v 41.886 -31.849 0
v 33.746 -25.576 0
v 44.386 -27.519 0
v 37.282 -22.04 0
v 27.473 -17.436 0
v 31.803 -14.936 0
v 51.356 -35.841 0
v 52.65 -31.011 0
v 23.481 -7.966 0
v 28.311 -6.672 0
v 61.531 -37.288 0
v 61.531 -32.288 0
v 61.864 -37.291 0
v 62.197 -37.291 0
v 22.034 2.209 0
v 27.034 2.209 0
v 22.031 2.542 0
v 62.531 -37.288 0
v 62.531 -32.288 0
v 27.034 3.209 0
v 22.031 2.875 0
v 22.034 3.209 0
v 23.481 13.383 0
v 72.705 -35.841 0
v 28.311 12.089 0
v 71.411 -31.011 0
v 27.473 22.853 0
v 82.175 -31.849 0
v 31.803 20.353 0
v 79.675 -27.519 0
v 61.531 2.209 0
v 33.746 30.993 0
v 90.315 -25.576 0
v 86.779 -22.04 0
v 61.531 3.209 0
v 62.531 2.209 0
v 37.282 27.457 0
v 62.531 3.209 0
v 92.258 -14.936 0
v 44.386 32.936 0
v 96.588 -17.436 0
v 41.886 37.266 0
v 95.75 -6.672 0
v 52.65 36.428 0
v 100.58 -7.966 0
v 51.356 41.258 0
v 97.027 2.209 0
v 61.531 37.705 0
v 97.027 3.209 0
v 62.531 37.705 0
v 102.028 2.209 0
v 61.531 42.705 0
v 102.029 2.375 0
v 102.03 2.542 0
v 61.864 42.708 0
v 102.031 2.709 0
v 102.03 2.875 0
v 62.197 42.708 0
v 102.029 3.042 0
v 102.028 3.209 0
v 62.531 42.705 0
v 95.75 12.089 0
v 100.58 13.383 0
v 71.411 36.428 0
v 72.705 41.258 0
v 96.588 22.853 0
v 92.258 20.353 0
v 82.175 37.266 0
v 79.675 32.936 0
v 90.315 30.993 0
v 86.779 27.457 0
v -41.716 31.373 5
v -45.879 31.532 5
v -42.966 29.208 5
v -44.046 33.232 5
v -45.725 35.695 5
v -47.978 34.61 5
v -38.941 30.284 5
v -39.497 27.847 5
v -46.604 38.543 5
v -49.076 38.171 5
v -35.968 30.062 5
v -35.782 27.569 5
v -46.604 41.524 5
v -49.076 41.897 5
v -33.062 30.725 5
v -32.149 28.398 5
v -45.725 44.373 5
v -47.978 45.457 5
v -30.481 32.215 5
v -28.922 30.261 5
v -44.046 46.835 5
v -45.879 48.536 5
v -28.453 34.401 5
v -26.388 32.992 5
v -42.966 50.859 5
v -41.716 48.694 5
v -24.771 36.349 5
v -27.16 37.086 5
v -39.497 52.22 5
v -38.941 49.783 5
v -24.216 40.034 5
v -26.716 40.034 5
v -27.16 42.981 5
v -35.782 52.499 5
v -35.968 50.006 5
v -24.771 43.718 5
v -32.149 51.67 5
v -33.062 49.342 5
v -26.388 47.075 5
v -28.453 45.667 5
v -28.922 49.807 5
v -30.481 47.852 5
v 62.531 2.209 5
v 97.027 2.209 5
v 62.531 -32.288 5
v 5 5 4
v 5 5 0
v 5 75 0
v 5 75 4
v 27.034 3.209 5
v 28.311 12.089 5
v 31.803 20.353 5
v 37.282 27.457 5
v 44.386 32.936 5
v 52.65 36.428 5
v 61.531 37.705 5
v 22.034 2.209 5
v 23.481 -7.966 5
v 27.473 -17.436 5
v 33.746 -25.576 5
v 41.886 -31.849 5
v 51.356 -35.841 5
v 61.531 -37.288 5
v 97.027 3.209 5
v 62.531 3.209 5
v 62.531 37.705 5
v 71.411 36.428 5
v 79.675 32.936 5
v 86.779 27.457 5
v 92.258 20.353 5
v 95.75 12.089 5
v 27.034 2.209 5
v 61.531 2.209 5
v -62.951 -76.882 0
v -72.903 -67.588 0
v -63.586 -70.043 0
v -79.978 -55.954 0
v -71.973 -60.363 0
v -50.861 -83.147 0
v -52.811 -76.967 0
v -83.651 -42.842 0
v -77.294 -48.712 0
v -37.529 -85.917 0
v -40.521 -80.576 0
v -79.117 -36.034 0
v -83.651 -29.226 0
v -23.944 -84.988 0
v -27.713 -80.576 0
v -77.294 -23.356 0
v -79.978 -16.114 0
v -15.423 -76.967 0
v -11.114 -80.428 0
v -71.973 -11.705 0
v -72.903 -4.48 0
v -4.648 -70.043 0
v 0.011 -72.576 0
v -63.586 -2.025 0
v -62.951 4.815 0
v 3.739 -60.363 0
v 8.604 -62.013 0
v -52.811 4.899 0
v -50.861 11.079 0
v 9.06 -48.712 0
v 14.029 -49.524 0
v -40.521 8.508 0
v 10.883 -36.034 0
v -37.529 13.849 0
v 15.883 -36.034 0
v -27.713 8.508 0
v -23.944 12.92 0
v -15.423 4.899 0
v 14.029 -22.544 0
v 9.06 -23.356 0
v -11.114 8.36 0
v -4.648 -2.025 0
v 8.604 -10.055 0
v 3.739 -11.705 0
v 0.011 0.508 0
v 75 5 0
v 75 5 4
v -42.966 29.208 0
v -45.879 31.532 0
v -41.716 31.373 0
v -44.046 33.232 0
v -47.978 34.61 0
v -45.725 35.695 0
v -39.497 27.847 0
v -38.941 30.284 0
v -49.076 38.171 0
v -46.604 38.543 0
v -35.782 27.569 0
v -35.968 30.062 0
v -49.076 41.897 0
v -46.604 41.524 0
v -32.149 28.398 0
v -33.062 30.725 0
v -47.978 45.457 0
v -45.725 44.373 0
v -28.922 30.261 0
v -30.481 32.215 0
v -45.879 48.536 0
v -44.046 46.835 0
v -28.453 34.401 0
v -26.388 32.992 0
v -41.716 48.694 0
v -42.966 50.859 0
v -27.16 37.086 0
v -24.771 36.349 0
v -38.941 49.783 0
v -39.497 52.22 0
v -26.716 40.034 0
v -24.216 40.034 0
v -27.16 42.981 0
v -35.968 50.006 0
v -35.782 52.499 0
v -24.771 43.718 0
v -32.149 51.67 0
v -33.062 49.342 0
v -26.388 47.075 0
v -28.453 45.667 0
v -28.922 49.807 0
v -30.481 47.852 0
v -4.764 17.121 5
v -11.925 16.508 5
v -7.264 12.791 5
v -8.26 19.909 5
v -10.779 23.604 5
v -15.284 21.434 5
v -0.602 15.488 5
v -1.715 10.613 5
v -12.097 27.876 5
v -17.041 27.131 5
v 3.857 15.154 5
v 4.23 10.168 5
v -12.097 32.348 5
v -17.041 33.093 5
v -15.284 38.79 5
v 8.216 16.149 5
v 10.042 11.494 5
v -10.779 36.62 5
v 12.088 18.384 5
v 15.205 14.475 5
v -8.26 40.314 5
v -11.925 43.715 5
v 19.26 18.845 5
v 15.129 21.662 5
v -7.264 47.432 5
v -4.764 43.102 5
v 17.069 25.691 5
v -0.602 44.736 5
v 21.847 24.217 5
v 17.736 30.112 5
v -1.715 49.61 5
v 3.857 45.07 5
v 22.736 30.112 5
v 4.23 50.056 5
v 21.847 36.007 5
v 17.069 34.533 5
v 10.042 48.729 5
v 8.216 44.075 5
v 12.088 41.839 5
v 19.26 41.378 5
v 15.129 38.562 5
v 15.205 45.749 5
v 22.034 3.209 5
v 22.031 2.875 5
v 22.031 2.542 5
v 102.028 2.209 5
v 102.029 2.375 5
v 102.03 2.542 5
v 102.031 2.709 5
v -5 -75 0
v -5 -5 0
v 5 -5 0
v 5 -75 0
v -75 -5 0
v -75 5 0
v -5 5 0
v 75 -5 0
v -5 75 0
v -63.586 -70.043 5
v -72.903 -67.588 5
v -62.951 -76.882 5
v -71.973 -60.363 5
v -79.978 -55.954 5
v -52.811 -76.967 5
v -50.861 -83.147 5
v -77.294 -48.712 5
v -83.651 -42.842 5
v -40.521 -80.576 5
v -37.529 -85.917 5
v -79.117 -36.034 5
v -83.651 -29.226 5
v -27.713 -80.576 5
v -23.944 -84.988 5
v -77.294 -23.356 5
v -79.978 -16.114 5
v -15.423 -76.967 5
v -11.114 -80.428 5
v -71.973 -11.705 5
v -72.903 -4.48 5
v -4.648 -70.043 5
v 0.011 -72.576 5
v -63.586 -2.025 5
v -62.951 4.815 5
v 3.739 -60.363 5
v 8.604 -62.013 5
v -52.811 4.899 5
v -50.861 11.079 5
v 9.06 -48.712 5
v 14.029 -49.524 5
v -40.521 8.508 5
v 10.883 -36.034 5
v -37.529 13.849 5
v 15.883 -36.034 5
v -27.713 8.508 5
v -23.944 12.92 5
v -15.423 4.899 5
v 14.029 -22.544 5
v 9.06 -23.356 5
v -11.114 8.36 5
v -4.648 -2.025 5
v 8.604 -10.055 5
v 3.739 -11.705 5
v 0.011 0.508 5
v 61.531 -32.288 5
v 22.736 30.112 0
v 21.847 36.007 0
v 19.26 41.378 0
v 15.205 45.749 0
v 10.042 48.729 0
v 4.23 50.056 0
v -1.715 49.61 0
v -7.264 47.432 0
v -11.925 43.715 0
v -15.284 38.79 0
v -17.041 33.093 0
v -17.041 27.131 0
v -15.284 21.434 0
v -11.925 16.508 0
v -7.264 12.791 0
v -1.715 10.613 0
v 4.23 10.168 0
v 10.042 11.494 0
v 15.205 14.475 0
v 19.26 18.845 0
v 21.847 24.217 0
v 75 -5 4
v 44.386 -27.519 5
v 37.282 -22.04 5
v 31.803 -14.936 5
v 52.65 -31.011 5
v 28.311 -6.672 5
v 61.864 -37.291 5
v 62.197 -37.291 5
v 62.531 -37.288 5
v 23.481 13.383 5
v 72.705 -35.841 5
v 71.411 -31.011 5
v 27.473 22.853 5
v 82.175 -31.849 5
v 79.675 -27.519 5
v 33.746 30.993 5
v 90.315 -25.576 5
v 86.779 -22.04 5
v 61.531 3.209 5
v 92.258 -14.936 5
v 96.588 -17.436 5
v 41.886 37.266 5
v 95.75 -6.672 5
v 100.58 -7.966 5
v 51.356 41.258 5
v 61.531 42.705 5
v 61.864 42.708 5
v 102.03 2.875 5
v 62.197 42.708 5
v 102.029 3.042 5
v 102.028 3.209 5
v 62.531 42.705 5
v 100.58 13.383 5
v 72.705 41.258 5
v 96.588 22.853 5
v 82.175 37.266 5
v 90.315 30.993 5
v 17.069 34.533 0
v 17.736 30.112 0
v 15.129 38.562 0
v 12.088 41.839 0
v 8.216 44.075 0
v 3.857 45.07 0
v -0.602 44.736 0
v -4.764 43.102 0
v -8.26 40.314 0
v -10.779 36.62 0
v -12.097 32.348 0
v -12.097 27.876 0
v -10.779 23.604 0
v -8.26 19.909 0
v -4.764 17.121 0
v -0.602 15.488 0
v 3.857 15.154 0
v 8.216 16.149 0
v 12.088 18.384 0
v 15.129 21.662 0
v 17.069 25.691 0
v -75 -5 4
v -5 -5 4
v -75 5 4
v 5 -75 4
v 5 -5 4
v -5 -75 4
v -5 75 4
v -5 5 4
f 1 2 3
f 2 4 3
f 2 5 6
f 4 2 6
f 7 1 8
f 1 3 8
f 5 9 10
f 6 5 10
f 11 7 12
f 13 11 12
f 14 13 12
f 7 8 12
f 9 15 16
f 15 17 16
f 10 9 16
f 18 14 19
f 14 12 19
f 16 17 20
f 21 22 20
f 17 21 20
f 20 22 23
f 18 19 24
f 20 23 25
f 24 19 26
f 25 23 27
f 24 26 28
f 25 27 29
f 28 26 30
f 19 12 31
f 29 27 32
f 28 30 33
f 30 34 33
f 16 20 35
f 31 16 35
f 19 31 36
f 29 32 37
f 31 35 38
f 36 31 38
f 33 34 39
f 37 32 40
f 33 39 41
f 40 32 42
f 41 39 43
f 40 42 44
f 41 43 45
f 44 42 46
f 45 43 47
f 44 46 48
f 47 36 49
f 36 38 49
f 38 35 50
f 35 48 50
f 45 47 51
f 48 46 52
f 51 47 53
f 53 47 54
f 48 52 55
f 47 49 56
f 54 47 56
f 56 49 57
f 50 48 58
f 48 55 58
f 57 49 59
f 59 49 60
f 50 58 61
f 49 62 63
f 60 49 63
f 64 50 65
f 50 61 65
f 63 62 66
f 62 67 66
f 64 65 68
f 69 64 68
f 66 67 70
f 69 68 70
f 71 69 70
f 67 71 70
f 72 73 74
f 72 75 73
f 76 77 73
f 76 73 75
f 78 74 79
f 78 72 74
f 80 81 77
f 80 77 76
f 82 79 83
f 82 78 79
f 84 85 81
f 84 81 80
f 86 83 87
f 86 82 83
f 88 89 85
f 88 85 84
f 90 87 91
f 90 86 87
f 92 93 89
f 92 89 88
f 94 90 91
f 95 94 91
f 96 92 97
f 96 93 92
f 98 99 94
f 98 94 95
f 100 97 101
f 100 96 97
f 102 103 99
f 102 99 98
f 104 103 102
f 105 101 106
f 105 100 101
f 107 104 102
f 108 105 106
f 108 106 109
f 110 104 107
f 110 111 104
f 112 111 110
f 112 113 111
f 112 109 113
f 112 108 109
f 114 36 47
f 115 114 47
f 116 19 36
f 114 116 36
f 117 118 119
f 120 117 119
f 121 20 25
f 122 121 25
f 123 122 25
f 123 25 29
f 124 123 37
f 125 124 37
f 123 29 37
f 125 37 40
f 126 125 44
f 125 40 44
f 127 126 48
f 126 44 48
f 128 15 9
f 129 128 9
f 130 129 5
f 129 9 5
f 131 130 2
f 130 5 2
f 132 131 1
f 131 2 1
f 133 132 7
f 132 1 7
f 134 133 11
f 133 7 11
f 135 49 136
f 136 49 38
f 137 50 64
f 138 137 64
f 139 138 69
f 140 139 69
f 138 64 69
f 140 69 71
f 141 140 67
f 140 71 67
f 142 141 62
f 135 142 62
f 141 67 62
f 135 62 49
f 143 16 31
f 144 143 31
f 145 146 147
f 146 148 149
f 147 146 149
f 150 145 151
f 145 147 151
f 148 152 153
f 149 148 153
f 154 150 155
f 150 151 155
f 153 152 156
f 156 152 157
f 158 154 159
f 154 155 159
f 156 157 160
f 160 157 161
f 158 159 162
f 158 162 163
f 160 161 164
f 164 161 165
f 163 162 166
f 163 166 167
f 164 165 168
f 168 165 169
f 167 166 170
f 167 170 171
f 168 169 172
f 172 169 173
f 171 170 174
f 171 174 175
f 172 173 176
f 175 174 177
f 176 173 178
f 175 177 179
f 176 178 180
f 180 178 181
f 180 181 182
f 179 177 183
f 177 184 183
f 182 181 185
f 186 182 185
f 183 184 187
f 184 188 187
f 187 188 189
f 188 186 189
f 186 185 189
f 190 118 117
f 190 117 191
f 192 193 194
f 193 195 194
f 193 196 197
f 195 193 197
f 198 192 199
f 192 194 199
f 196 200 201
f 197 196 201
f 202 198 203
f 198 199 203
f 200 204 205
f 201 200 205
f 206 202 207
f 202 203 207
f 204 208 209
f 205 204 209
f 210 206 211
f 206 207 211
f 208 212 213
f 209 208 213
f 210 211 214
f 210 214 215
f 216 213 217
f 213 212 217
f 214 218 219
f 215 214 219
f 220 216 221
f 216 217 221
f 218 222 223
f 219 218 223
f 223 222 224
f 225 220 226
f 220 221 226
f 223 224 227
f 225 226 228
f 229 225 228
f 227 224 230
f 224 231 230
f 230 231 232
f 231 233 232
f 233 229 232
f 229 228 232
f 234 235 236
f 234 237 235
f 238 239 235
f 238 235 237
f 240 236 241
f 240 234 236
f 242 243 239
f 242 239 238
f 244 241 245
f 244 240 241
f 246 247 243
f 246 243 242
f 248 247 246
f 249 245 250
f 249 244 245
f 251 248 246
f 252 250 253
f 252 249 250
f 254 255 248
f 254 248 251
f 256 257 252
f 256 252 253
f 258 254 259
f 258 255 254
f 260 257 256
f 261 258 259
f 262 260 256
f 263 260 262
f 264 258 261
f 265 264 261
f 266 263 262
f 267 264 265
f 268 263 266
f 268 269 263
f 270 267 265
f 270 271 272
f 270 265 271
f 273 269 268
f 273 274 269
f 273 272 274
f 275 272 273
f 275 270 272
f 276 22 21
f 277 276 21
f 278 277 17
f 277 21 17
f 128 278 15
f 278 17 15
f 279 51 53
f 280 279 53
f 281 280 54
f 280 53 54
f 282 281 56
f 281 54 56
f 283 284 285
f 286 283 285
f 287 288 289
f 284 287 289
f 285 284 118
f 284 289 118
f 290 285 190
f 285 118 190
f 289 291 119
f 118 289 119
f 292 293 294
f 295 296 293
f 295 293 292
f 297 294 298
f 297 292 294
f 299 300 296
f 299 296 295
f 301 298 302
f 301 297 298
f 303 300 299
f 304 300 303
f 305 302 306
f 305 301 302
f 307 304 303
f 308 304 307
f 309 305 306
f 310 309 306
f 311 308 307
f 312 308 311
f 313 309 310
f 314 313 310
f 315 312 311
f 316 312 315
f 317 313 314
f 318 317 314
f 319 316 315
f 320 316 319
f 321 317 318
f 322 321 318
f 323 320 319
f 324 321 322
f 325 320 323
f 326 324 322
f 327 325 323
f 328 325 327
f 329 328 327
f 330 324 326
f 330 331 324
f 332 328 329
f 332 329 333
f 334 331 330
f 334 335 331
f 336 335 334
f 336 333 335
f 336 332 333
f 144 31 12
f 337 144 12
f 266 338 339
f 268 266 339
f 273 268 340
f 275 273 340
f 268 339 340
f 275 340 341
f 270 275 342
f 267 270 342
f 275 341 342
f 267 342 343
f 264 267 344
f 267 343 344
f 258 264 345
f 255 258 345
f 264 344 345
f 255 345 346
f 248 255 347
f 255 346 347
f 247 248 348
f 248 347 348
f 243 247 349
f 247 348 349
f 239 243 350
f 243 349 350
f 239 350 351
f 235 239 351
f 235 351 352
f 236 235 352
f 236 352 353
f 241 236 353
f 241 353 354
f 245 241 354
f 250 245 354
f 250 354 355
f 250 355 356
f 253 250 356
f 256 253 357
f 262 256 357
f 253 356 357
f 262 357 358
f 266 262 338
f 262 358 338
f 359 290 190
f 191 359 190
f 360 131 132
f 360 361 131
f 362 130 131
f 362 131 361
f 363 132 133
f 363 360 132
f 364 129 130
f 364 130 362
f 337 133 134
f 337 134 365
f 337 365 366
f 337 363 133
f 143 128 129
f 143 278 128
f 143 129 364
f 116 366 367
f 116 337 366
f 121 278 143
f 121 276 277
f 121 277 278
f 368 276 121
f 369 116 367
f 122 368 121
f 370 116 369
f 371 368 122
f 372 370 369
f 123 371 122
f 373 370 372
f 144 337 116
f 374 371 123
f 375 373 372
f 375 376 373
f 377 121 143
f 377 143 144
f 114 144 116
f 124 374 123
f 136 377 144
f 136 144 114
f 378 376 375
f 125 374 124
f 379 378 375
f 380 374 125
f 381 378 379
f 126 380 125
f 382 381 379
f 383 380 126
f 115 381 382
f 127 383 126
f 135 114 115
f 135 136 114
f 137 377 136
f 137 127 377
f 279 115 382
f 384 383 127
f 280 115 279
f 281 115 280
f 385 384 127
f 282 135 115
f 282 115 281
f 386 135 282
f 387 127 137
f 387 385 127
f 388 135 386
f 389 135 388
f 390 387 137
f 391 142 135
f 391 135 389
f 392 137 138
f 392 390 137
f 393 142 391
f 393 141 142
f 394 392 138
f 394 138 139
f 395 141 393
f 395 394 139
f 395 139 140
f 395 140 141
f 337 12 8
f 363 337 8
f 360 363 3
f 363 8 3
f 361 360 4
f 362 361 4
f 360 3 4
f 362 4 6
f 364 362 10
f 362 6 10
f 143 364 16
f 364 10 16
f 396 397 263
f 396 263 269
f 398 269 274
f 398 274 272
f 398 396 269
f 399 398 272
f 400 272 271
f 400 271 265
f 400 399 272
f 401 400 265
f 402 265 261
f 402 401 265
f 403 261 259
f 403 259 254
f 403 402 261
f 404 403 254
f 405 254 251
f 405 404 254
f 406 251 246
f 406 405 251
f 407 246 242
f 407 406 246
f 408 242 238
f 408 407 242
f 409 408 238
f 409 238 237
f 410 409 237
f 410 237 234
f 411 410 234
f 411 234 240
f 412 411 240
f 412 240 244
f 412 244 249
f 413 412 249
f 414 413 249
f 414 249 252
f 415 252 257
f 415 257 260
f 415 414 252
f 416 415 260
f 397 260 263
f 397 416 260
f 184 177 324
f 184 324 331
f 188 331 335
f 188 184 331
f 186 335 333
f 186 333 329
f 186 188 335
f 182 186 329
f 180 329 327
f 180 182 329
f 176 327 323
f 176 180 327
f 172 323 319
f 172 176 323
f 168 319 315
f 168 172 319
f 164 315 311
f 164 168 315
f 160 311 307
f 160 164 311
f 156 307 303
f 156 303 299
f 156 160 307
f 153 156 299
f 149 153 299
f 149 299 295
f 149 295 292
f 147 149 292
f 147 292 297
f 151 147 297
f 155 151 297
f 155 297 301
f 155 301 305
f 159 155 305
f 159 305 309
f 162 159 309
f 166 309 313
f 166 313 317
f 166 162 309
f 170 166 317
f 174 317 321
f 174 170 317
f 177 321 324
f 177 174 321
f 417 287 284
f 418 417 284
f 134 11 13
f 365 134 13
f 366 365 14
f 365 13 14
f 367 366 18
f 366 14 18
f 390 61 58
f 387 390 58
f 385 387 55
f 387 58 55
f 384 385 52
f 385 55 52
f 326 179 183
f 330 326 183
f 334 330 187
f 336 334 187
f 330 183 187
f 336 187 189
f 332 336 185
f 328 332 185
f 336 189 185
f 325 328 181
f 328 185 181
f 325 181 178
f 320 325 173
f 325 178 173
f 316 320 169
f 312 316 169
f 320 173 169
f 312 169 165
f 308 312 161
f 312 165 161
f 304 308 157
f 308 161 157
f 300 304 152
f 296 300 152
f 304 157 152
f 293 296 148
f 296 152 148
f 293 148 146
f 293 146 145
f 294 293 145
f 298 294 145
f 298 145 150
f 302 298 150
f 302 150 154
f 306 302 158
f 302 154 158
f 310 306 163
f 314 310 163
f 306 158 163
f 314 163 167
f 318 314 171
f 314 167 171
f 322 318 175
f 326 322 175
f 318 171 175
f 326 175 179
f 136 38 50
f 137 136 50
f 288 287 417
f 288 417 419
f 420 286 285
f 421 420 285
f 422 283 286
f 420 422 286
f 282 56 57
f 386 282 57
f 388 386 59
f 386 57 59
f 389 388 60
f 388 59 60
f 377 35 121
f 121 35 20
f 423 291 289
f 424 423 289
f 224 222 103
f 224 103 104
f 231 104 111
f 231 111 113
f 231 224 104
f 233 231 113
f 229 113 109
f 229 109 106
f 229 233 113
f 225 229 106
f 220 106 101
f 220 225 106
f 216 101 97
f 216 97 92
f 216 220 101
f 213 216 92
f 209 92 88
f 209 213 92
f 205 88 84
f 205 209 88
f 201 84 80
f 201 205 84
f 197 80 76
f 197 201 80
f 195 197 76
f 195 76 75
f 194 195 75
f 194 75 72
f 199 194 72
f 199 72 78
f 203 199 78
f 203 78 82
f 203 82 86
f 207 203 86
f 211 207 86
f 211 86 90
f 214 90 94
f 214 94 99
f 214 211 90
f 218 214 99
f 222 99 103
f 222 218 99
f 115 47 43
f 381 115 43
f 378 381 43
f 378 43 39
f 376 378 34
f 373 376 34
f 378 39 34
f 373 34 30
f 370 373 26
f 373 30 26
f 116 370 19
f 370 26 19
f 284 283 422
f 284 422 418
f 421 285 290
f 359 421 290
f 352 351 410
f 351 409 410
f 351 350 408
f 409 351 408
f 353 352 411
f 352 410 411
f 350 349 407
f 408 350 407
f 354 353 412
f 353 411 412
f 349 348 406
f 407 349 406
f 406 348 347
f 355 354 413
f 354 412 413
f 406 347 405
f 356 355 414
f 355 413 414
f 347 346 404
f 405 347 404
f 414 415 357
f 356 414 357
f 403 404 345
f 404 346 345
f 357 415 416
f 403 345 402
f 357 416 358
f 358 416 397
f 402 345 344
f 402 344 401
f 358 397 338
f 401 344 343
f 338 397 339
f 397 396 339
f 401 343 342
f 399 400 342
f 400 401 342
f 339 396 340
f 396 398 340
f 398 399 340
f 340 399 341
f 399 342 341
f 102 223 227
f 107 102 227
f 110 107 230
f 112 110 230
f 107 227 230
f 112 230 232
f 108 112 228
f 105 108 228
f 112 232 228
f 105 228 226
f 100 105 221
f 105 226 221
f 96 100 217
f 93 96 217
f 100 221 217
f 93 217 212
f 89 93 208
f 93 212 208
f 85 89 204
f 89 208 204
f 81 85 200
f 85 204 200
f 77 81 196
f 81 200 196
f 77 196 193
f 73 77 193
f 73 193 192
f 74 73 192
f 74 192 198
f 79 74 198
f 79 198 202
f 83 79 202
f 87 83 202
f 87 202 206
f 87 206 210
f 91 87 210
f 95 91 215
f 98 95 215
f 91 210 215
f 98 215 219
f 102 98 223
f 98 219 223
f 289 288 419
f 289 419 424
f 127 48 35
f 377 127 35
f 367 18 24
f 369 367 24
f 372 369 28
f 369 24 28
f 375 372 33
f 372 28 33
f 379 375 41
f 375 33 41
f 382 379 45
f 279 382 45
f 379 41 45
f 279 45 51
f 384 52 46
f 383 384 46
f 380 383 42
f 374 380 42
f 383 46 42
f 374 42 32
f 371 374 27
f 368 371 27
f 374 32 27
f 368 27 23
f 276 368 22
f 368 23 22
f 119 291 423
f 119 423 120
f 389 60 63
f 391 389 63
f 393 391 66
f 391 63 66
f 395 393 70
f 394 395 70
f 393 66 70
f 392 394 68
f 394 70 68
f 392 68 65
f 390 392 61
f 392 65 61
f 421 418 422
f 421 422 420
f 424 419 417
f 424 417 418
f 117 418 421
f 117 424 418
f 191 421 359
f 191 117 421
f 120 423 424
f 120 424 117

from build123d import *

# Parameters (mm, degrees)
F0_W     = 10
F0_H     = 70
F0_H_2   = 10
F0_W_2   = 70
F1_DEPTH = 4
F2_R     = 12.5
F2_R_2   = 10
F3_DEPTH = 5
F2_R_3   = 20
F2_R_4   = 15
F2_W     = 1
F2_H     = 1
F2_R_5   = 50
F2_R_6   = 45


with BuildPart() as f1:
    # F0 (on Top) → F1 (new body)
    with BuildSketch(Plane.XY):
        with Locations((0, 40)):
            Rectangle(F0_W, F0_H)
        Rectangle(F0_W, F0_H_2)
        with Locations((-40, 0)):
            Rectangle(F0_W_2, F0_H_2)
        with Locations((40, 0)):
            Rectangle(F0_W_2, F0_H_2)
        with Locations((0, -40)):
            Rectangle(F0_W, F0_H)
    extrude(amount=F1_DEPTH)


with BuildPart() as f3:
    # F2 (on Top) → F3 (new body)
    with BuildSketch(Plane.XY):
        with Locations((-36.7156490684, 40.033750236)):
            Circle(F2_R)
        with Locations((-36.7156490684, 40.033750236)):
            Circle(F2_R_2, mode=Mode.SUBTRACT)
    extrude(amount=F3_DEPTH)


with BuildPart() as f3b:
    # F2 (on Top) → F3, piece 2 (new body)
    with BuildSketch(Plane.XY):
        with Locations((2.7356152423, 30.1118772477)):
            Circle(F2_R_3)
        with Locations((2.7356152423, 30.1118772477)):
            Circle(F2_R_4, mode=Mode.SUBTRACT)
    extrude(amount=F3_DEPTH)


with BuildPart() as f3c:
    # F2 (on Top) → F3, piece 3 (new body)
    with BuildSketch(Plane.XY):
        with BuildLine():
            ThreePointArc((97.0270567127, 3.2086024638), (97.0297354095, 2.9586088419), (97.0306283236, 2.7086024638))
            ThreePointArc((97.0306283236, 2.7086024638), (97.0297354095, 2.4585960857), (97.0270567127, 2.2086024638))
            Line((97.0270567127, 2.2086024638), (102.0275032015, 2.2086024638))
            ThreePointArc((102.0275032015, 2.2086024638), (102.0298470354, 2.4585975807), (102.0306283236, 2.7086024638))
            ThreePointArc((102.0306283236, 2.7086024638), (102.0298470354, 2.958607347), (102.0275032015, 3.2086024638))
            Line((102.0275032015, 3.2086024638), (97.0270567127, 3.2086024638))
        make_face()
        with BuildLine():
            ThreePointArc((62.5306283236, 37.705030853), (86.7793656651, 27.4573398054), (97.0270567127, 3.2086024638))
            Line((97.0270567127, 3.2086024638), (102.0275032015, 3.2086024638))
            ThreePointArc((102.0275032015, 3.2086024638), (90.314899571, 30.9928737113), (62.5306283236, 42.7054773417))
            Line((62.5306283236, 42.7054773417), (62.5306283236, 37.705030853))
        make_face()
        with BuildLine():
            Line((102.0275032015, 2.2086024638), (97.0270567127, 2.2086024638))
            ThreePointArc((97.0270567127, 2.2086024638), (86.7793656651, -22.0401348777), (62.5306283236, -32.2878259254))
            Line((62.5306283236, -32.2878259254), (62.5306283236, -37.2882724141))
            ThreePointArc((62.5306283236, -37.2882724141), (90.314899571, -25.5756687836), (102.0275032015, 2.2086024638))
        make_face()
        with BuildLine():
            ThreePointArc((61.5306283236, 37.705030853), (62.0306283236, 37.7086024638), (62.5306283236, 37.705030853))
            Line((62.5306283236, 37.705030853), (62.5306283236, 42.7054773417))
            ThreePointArc((62.5306283236, 42.7054773417), (62.0306283236, 42.7086024638), (61.5306283236, 42.7054773417))
            Line((61.5306283236, 42.7054773417), (61.5306283236, 37.705030853))
        make_face()
        with BuildLine():
            Line((62.5306283236, -37.2882724141), (62.5306283236, -32.2878259254))
            ThreePointArc((62.5306283236, -32.2878259254), (62.0306283236, -32.2913975362), (61.5306283236, -32.2878259254))
            Line((61.5306283236, -32.2878259254), (61.5306283236, -37.2882724141))
            ThreePointArc((61.5306283236, -37.2882724141), (62.0306283236, -37.2913975362), (62.5306283236, -37.2882724141))
        make_face()
        with BuildLine():
            ThreePointArc((27.0341999344, 3.2086024638), (37.281890982, 27.4573398054), (61.5306283236, 37.705030853))
            Line((61.5306283236, 37.705030853), (61.5306283236, 42.7054773417))
            ThreePointArc((61.5306283236, 42.7054773417), (33.7463570761, 30.9928737113), (22.0337534456, 3.2086024638))
            Line((22.0337534456, 3.2086024638), (27.0341999344, 3.2086024638))
        make_face()
        with BuildLine():
            Line((61.5306283236, -37.2882724141), (61.5306283236, -32.2878259254))
            ThreePointArc((61.5306283236, -32.2878259254), (37.281890982, -22.0401348777), (27.0341999344, 2.2086024638))
            Line((27.0341999344, 2.2086024638), (22.0337534456, 2.2086024638))
            ThreePointArc((22.0337534456, 2.2086024638), (33.7463570761, -25.5756687836), (61.5306283236, -37.2882724141))
        make_face()
        with BuildLine():
            ThreePointArc((27.0341999344, 2.2086024638), (27.0306283236, 2.7086024638), (27.0341999344, 3.2086024638))
            Line((27.0341999344, 3.2086024638), (22.0337534456, 3.2086024638))
            ThreePointArc((22.0337534456, 3.2086024638), (22.0306283236, 2.7086024638), (22.0337534456, 2.2086024638))
            Line((22.0337534456, 2.2086024638), (27.0341999344, 2.2086024638))
        make_face()
        with BuildLine():
            Line((62.5306283236, 3.2086024638), (62.5306283236, 37.705030853))
            ThreePointArc((62.5306283236, 37.705030853), (62.0306283236, 37.7086024638), (61.5306283236, 37.705030853))
            Line((61.5306283236, 37.705030853), (61.5306283236, 3.2086024638))
            Line((61.5306283236, 3.2086024638), (62.5306283236, 3.2086024638))
        make_face()
        with BuildLine():
            Line((61.5306283236, 2.2086024638), (61.5306283236, 3.2086024638))
            Line((61.5306283236, 3.2086024638), (27.0341999344, 3.2086024638))
            ThreePointArc((27.0341999344, 3.2086024638), (27.0306283236, 2.7086024638), (27.0341999344, 2.2086024638))
            Line((27.0341999344, 2.2086024638), (61.5306283236, 2.2086024638))
        make_face()
        with BuildLine():
            ThreePointArc((97.0270567127, 2.2086024638), (97.0297354095, 2.4585960857), (97.0306283236, 2.7086024638))
            ThreePointArc((97.0306283236, 2.7086024638), (97.0297354095, 2.9586088419), (97.0270567127, 3.2086024638))
            Line((97.0270567127, 3.2086024638), (62.5306283236, 3.2086024638))
            Line((62.5306283236, 3.2086024638), (62.5306283236, 2.2086024638))
            Line((62.5306283236, 2.2086024638), (97.0270567127, 2.2086024638))
        make_face()
        with Locations((62.0306283236, 2.7086024638)):
            Rectangle(F2_W, F2_H)
        with BuildLine():
            ThreePointArc((61.5306283236, -32.2878259254), (62.0306283236, -32.2913975362), (62.5306283236, -32.2878259254))
            Line((62.5306283236, -32.2878259254), (62.5306283236, 2.2086024638))
            Line((62.5306283236, 2.2086024638), (61.5306283236, 2.2086024638))
            Line((61.5306283236, 2.2086024638), (61.5306283236, -32.2878259254))
        make_face()
    extrude(amount=F3_DEPTH)


with BuildPart() as f3d:
    # F2 (on Top) → F3, piece 4 (new body)
    with BuildSketch(Plane.XY):
        with Locations((-34.1170616448, -36.0339581966)):
            Circle(F2_R_5)
        with Locations((-34.1170616448, -36.0339581966)):
            Circle(F2_R_6, mode=Mode.SUBTRACT)
    extrude(amount=F3_DEPTH)


solid = Compound([f1.part, f3.part, f3b.part, f3c.part, f3d.part])
